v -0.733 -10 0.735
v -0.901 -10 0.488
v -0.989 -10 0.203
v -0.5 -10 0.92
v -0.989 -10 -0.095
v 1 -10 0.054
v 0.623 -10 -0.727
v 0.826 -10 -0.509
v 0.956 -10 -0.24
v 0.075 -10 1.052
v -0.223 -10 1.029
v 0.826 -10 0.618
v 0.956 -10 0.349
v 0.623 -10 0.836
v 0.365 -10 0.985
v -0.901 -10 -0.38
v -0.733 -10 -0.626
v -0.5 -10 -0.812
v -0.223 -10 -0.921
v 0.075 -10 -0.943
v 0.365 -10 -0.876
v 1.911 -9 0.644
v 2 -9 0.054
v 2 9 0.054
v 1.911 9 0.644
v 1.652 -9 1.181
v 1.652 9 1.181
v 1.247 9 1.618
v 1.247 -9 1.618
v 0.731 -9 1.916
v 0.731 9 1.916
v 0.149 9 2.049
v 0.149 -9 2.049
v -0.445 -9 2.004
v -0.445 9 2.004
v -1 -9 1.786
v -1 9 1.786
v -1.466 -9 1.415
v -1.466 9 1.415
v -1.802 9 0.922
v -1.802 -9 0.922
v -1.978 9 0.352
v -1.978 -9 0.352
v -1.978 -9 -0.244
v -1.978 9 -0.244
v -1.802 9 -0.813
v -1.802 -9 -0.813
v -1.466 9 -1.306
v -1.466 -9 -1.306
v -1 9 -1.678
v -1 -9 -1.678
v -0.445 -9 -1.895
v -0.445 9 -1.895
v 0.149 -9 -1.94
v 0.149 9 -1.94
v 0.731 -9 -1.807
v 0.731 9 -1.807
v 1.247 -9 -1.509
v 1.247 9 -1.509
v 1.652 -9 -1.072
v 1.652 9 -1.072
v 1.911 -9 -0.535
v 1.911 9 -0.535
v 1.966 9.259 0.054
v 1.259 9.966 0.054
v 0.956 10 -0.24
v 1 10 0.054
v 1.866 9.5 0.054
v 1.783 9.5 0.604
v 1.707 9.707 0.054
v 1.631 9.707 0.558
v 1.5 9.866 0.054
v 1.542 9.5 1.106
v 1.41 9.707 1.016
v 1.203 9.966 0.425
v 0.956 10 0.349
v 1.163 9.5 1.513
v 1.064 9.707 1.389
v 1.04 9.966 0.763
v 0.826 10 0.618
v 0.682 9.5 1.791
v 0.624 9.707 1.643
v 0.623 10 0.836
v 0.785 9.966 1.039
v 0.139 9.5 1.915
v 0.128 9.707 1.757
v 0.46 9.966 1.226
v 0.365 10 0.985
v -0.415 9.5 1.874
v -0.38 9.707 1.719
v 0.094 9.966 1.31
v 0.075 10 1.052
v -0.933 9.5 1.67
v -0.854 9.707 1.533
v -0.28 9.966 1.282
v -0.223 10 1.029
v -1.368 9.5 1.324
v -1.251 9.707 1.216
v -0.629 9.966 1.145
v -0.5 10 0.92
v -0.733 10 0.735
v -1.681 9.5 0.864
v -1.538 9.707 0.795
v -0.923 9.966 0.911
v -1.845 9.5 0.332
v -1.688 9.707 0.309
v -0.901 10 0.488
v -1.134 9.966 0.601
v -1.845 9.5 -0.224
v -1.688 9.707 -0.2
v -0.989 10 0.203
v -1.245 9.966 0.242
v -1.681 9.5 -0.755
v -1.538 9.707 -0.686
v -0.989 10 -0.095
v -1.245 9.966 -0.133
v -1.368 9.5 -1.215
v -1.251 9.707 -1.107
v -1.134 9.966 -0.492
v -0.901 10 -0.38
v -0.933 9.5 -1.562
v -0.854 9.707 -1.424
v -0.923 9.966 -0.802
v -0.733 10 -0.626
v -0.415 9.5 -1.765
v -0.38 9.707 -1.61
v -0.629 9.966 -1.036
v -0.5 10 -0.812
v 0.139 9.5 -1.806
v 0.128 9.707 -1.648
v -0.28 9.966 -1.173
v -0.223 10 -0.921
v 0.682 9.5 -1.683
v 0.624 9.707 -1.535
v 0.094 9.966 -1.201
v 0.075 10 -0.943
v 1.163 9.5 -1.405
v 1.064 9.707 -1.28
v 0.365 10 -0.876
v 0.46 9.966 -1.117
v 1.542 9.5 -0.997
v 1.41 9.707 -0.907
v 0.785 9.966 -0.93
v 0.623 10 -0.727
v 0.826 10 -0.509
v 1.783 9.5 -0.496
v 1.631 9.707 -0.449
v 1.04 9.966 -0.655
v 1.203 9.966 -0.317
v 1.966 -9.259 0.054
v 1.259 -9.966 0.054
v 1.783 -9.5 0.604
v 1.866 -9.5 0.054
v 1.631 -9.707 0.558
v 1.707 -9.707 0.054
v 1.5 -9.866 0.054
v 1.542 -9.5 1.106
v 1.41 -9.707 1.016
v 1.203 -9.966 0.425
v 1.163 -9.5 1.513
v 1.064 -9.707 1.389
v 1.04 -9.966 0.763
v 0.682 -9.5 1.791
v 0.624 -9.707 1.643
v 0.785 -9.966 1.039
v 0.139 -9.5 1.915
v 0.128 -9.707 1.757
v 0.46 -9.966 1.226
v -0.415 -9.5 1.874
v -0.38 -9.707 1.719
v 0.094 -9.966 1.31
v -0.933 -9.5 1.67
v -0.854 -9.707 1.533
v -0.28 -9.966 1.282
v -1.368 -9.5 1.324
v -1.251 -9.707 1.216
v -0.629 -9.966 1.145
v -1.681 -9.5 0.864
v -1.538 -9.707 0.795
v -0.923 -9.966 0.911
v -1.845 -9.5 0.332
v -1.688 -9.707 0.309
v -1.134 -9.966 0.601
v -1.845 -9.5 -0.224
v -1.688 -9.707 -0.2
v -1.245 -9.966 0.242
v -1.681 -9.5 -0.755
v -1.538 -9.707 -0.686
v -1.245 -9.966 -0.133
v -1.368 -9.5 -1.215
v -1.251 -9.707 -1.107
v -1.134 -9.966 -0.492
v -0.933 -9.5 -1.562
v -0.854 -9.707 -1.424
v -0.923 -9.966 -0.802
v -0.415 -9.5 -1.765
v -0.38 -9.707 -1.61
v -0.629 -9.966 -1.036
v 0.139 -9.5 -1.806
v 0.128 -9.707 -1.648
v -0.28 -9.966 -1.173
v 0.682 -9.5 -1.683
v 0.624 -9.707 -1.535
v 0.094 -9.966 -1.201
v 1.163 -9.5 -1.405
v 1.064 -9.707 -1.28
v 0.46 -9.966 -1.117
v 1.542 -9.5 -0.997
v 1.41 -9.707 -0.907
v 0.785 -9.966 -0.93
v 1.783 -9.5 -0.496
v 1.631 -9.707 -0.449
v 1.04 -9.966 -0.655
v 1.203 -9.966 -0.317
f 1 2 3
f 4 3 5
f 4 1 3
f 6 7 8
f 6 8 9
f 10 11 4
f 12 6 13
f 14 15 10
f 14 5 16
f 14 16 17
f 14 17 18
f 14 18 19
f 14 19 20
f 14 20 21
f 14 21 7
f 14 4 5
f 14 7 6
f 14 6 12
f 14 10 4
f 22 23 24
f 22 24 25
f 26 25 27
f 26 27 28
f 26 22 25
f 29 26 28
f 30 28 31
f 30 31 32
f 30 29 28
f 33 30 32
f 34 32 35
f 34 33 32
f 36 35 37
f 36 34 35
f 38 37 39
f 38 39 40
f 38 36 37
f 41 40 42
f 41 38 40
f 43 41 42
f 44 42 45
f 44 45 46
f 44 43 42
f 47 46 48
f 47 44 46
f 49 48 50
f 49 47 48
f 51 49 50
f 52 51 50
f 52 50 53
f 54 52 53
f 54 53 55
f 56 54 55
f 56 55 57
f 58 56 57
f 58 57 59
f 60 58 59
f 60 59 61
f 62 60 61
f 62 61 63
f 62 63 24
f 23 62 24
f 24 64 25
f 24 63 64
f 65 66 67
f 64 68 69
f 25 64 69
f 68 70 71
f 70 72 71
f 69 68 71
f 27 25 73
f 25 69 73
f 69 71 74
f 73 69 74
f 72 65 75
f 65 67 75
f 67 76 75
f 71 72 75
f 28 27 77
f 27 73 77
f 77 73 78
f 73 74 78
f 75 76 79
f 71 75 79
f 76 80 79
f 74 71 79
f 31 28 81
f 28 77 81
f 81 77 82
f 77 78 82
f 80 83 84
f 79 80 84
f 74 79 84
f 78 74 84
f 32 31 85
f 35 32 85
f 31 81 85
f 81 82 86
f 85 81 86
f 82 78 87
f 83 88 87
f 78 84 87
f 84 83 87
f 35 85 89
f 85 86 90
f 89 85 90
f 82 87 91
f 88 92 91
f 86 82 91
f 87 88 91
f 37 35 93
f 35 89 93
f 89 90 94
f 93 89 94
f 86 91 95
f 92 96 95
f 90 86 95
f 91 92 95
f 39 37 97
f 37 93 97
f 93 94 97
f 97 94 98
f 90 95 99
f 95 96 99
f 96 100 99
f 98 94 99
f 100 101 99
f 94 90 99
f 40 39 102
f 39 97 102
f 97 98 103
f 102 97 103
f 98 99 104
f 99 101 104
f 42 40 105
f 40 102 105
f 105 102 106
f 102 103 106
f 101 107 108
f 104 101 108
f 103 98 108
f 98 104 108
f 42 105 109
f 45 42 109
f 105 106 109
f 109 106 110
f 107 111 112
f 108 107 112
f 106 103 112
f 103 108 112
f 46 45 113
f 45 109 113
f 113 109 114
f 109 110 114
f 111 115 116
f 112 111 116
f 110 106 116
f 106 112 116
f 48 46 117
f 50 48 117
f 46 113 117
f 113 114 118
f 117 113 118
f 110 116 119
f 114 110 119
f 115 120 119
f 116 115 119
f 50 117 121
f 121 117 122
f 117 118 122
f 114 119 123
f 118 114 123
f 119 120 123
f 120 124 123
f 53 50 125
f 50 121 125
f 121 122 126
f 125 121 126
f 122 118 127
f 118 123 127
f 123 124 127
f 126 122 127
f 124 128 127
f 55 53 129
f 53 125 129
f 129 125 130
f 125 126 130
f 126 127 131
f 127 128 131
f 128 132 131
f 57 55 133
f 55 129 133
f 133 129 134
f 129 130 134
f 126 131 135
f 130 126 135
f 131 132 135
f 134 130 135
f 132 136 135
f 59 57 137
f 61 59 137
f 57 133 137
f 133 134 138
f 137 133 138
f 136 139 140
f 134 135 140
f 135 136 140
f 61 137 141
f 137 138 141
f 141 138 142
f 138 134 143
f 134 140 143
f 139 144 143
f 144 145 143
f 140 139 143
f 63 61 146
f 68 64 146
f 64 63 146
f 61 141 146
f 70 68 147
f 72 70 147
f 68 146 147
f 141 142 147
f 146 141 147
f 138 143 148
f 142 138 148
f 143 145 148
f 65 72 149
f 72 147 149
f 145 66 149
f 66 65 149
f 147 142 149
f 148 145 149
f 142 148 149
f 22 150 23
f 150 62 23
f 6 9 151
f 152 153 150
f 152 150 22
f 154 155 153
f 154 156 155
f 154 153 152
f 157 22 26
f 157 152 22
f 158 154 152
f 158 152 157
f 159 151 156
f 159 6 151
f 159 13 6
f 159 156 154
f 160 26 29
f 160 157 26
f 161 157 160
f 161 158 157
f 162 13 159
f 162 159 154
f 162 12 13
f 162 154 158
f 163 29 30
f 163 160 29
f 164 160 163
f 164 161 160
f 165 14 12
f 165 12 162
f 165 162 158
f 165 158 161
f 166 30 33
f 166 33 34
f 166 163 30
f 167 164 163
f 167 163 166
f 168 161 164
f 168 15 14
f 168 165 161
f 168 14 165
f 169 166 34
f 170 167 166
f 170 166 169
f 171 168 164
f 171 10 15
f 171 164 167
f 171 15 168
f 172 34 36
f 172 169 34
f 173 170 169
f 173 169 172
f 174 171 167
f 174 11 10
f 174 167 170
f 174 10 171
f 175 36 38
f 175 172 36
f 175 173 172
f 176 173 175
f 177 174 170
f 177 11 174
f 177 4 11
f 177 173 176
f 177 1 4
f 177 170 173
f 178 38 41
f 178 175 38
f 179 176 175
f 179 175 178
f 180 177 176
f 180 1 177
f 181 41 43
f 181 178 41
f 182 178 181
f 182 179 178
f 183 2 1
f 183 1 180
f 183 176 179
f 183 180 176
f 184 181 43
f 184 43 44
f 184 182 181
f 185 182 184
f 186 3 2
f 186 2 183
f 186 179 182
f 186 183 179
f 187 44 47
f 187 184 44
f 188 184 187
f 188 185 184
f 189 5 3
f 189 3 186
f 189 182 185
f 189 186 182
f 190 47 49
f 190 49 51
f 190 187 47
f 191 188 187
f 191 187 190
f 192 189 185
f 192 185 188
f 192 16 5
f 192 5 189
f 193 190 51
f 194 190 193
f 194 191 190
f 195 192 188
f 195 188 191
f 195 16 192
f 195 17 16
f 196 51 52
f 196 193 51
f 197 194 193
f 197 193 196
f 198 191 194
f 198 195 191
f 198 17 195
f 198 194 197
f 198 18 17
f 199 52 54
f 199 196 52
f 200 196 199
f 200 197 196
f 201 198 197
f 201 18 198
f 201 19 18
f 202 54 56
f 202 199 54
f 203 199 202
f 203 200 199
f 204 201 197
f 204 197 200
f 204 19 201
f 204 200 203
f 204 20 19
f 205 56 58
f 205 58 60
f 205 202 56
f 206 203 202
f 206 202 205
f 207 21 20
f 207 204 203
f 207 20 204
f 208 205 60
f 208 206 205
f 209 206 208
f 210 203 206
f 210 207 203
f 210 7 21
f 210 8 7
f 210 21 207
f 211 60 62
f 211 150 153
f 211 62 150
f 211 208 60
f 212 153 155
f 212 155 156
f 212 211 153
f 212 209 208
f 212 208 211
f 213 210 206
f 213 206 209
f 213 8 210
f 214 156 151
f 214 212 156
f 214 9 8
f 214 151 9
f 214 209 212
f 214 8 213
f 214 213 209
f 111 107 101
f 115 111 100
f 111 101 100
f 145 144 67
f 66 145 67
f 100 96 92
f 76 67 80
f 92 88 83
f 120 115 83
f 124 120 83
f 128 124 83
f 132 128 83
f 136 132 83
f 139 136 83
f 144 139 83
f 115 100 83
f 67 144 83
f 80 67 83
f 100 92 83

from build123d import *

# Parameters (mm, degrees)
F0_R     = 2
F1_DEPTH = 10
F2_DEPTH = 10
F3_R     = 1


with BuildPart() as f1:
    # F0 (on Front) → F1 (new body, symmetric)
    with BuildSketch(Plane.XZ):
        with Locations((0, 0.054377)):
            Circle(F0_R)
    extrude(amount=F1_DEPTH, both=True)

    # F0 (on Front) → F2 (join, symmetric)
    with BuildSketch(Plane.XZ):
        with Locations((0, 0.054377)):
            Circle(F0_R)
    extrude(amount=F2_DEPTH, both=True)

    # F3
    f3_edges = [f1.edges().sort_by_distance(p)[0] for p in [
        (-2, -10, 0.054377),
        (-2, 10, 0.054377),
    ]]
    fillet(f3_edges, radius=F3_R)


solid = f1.part
